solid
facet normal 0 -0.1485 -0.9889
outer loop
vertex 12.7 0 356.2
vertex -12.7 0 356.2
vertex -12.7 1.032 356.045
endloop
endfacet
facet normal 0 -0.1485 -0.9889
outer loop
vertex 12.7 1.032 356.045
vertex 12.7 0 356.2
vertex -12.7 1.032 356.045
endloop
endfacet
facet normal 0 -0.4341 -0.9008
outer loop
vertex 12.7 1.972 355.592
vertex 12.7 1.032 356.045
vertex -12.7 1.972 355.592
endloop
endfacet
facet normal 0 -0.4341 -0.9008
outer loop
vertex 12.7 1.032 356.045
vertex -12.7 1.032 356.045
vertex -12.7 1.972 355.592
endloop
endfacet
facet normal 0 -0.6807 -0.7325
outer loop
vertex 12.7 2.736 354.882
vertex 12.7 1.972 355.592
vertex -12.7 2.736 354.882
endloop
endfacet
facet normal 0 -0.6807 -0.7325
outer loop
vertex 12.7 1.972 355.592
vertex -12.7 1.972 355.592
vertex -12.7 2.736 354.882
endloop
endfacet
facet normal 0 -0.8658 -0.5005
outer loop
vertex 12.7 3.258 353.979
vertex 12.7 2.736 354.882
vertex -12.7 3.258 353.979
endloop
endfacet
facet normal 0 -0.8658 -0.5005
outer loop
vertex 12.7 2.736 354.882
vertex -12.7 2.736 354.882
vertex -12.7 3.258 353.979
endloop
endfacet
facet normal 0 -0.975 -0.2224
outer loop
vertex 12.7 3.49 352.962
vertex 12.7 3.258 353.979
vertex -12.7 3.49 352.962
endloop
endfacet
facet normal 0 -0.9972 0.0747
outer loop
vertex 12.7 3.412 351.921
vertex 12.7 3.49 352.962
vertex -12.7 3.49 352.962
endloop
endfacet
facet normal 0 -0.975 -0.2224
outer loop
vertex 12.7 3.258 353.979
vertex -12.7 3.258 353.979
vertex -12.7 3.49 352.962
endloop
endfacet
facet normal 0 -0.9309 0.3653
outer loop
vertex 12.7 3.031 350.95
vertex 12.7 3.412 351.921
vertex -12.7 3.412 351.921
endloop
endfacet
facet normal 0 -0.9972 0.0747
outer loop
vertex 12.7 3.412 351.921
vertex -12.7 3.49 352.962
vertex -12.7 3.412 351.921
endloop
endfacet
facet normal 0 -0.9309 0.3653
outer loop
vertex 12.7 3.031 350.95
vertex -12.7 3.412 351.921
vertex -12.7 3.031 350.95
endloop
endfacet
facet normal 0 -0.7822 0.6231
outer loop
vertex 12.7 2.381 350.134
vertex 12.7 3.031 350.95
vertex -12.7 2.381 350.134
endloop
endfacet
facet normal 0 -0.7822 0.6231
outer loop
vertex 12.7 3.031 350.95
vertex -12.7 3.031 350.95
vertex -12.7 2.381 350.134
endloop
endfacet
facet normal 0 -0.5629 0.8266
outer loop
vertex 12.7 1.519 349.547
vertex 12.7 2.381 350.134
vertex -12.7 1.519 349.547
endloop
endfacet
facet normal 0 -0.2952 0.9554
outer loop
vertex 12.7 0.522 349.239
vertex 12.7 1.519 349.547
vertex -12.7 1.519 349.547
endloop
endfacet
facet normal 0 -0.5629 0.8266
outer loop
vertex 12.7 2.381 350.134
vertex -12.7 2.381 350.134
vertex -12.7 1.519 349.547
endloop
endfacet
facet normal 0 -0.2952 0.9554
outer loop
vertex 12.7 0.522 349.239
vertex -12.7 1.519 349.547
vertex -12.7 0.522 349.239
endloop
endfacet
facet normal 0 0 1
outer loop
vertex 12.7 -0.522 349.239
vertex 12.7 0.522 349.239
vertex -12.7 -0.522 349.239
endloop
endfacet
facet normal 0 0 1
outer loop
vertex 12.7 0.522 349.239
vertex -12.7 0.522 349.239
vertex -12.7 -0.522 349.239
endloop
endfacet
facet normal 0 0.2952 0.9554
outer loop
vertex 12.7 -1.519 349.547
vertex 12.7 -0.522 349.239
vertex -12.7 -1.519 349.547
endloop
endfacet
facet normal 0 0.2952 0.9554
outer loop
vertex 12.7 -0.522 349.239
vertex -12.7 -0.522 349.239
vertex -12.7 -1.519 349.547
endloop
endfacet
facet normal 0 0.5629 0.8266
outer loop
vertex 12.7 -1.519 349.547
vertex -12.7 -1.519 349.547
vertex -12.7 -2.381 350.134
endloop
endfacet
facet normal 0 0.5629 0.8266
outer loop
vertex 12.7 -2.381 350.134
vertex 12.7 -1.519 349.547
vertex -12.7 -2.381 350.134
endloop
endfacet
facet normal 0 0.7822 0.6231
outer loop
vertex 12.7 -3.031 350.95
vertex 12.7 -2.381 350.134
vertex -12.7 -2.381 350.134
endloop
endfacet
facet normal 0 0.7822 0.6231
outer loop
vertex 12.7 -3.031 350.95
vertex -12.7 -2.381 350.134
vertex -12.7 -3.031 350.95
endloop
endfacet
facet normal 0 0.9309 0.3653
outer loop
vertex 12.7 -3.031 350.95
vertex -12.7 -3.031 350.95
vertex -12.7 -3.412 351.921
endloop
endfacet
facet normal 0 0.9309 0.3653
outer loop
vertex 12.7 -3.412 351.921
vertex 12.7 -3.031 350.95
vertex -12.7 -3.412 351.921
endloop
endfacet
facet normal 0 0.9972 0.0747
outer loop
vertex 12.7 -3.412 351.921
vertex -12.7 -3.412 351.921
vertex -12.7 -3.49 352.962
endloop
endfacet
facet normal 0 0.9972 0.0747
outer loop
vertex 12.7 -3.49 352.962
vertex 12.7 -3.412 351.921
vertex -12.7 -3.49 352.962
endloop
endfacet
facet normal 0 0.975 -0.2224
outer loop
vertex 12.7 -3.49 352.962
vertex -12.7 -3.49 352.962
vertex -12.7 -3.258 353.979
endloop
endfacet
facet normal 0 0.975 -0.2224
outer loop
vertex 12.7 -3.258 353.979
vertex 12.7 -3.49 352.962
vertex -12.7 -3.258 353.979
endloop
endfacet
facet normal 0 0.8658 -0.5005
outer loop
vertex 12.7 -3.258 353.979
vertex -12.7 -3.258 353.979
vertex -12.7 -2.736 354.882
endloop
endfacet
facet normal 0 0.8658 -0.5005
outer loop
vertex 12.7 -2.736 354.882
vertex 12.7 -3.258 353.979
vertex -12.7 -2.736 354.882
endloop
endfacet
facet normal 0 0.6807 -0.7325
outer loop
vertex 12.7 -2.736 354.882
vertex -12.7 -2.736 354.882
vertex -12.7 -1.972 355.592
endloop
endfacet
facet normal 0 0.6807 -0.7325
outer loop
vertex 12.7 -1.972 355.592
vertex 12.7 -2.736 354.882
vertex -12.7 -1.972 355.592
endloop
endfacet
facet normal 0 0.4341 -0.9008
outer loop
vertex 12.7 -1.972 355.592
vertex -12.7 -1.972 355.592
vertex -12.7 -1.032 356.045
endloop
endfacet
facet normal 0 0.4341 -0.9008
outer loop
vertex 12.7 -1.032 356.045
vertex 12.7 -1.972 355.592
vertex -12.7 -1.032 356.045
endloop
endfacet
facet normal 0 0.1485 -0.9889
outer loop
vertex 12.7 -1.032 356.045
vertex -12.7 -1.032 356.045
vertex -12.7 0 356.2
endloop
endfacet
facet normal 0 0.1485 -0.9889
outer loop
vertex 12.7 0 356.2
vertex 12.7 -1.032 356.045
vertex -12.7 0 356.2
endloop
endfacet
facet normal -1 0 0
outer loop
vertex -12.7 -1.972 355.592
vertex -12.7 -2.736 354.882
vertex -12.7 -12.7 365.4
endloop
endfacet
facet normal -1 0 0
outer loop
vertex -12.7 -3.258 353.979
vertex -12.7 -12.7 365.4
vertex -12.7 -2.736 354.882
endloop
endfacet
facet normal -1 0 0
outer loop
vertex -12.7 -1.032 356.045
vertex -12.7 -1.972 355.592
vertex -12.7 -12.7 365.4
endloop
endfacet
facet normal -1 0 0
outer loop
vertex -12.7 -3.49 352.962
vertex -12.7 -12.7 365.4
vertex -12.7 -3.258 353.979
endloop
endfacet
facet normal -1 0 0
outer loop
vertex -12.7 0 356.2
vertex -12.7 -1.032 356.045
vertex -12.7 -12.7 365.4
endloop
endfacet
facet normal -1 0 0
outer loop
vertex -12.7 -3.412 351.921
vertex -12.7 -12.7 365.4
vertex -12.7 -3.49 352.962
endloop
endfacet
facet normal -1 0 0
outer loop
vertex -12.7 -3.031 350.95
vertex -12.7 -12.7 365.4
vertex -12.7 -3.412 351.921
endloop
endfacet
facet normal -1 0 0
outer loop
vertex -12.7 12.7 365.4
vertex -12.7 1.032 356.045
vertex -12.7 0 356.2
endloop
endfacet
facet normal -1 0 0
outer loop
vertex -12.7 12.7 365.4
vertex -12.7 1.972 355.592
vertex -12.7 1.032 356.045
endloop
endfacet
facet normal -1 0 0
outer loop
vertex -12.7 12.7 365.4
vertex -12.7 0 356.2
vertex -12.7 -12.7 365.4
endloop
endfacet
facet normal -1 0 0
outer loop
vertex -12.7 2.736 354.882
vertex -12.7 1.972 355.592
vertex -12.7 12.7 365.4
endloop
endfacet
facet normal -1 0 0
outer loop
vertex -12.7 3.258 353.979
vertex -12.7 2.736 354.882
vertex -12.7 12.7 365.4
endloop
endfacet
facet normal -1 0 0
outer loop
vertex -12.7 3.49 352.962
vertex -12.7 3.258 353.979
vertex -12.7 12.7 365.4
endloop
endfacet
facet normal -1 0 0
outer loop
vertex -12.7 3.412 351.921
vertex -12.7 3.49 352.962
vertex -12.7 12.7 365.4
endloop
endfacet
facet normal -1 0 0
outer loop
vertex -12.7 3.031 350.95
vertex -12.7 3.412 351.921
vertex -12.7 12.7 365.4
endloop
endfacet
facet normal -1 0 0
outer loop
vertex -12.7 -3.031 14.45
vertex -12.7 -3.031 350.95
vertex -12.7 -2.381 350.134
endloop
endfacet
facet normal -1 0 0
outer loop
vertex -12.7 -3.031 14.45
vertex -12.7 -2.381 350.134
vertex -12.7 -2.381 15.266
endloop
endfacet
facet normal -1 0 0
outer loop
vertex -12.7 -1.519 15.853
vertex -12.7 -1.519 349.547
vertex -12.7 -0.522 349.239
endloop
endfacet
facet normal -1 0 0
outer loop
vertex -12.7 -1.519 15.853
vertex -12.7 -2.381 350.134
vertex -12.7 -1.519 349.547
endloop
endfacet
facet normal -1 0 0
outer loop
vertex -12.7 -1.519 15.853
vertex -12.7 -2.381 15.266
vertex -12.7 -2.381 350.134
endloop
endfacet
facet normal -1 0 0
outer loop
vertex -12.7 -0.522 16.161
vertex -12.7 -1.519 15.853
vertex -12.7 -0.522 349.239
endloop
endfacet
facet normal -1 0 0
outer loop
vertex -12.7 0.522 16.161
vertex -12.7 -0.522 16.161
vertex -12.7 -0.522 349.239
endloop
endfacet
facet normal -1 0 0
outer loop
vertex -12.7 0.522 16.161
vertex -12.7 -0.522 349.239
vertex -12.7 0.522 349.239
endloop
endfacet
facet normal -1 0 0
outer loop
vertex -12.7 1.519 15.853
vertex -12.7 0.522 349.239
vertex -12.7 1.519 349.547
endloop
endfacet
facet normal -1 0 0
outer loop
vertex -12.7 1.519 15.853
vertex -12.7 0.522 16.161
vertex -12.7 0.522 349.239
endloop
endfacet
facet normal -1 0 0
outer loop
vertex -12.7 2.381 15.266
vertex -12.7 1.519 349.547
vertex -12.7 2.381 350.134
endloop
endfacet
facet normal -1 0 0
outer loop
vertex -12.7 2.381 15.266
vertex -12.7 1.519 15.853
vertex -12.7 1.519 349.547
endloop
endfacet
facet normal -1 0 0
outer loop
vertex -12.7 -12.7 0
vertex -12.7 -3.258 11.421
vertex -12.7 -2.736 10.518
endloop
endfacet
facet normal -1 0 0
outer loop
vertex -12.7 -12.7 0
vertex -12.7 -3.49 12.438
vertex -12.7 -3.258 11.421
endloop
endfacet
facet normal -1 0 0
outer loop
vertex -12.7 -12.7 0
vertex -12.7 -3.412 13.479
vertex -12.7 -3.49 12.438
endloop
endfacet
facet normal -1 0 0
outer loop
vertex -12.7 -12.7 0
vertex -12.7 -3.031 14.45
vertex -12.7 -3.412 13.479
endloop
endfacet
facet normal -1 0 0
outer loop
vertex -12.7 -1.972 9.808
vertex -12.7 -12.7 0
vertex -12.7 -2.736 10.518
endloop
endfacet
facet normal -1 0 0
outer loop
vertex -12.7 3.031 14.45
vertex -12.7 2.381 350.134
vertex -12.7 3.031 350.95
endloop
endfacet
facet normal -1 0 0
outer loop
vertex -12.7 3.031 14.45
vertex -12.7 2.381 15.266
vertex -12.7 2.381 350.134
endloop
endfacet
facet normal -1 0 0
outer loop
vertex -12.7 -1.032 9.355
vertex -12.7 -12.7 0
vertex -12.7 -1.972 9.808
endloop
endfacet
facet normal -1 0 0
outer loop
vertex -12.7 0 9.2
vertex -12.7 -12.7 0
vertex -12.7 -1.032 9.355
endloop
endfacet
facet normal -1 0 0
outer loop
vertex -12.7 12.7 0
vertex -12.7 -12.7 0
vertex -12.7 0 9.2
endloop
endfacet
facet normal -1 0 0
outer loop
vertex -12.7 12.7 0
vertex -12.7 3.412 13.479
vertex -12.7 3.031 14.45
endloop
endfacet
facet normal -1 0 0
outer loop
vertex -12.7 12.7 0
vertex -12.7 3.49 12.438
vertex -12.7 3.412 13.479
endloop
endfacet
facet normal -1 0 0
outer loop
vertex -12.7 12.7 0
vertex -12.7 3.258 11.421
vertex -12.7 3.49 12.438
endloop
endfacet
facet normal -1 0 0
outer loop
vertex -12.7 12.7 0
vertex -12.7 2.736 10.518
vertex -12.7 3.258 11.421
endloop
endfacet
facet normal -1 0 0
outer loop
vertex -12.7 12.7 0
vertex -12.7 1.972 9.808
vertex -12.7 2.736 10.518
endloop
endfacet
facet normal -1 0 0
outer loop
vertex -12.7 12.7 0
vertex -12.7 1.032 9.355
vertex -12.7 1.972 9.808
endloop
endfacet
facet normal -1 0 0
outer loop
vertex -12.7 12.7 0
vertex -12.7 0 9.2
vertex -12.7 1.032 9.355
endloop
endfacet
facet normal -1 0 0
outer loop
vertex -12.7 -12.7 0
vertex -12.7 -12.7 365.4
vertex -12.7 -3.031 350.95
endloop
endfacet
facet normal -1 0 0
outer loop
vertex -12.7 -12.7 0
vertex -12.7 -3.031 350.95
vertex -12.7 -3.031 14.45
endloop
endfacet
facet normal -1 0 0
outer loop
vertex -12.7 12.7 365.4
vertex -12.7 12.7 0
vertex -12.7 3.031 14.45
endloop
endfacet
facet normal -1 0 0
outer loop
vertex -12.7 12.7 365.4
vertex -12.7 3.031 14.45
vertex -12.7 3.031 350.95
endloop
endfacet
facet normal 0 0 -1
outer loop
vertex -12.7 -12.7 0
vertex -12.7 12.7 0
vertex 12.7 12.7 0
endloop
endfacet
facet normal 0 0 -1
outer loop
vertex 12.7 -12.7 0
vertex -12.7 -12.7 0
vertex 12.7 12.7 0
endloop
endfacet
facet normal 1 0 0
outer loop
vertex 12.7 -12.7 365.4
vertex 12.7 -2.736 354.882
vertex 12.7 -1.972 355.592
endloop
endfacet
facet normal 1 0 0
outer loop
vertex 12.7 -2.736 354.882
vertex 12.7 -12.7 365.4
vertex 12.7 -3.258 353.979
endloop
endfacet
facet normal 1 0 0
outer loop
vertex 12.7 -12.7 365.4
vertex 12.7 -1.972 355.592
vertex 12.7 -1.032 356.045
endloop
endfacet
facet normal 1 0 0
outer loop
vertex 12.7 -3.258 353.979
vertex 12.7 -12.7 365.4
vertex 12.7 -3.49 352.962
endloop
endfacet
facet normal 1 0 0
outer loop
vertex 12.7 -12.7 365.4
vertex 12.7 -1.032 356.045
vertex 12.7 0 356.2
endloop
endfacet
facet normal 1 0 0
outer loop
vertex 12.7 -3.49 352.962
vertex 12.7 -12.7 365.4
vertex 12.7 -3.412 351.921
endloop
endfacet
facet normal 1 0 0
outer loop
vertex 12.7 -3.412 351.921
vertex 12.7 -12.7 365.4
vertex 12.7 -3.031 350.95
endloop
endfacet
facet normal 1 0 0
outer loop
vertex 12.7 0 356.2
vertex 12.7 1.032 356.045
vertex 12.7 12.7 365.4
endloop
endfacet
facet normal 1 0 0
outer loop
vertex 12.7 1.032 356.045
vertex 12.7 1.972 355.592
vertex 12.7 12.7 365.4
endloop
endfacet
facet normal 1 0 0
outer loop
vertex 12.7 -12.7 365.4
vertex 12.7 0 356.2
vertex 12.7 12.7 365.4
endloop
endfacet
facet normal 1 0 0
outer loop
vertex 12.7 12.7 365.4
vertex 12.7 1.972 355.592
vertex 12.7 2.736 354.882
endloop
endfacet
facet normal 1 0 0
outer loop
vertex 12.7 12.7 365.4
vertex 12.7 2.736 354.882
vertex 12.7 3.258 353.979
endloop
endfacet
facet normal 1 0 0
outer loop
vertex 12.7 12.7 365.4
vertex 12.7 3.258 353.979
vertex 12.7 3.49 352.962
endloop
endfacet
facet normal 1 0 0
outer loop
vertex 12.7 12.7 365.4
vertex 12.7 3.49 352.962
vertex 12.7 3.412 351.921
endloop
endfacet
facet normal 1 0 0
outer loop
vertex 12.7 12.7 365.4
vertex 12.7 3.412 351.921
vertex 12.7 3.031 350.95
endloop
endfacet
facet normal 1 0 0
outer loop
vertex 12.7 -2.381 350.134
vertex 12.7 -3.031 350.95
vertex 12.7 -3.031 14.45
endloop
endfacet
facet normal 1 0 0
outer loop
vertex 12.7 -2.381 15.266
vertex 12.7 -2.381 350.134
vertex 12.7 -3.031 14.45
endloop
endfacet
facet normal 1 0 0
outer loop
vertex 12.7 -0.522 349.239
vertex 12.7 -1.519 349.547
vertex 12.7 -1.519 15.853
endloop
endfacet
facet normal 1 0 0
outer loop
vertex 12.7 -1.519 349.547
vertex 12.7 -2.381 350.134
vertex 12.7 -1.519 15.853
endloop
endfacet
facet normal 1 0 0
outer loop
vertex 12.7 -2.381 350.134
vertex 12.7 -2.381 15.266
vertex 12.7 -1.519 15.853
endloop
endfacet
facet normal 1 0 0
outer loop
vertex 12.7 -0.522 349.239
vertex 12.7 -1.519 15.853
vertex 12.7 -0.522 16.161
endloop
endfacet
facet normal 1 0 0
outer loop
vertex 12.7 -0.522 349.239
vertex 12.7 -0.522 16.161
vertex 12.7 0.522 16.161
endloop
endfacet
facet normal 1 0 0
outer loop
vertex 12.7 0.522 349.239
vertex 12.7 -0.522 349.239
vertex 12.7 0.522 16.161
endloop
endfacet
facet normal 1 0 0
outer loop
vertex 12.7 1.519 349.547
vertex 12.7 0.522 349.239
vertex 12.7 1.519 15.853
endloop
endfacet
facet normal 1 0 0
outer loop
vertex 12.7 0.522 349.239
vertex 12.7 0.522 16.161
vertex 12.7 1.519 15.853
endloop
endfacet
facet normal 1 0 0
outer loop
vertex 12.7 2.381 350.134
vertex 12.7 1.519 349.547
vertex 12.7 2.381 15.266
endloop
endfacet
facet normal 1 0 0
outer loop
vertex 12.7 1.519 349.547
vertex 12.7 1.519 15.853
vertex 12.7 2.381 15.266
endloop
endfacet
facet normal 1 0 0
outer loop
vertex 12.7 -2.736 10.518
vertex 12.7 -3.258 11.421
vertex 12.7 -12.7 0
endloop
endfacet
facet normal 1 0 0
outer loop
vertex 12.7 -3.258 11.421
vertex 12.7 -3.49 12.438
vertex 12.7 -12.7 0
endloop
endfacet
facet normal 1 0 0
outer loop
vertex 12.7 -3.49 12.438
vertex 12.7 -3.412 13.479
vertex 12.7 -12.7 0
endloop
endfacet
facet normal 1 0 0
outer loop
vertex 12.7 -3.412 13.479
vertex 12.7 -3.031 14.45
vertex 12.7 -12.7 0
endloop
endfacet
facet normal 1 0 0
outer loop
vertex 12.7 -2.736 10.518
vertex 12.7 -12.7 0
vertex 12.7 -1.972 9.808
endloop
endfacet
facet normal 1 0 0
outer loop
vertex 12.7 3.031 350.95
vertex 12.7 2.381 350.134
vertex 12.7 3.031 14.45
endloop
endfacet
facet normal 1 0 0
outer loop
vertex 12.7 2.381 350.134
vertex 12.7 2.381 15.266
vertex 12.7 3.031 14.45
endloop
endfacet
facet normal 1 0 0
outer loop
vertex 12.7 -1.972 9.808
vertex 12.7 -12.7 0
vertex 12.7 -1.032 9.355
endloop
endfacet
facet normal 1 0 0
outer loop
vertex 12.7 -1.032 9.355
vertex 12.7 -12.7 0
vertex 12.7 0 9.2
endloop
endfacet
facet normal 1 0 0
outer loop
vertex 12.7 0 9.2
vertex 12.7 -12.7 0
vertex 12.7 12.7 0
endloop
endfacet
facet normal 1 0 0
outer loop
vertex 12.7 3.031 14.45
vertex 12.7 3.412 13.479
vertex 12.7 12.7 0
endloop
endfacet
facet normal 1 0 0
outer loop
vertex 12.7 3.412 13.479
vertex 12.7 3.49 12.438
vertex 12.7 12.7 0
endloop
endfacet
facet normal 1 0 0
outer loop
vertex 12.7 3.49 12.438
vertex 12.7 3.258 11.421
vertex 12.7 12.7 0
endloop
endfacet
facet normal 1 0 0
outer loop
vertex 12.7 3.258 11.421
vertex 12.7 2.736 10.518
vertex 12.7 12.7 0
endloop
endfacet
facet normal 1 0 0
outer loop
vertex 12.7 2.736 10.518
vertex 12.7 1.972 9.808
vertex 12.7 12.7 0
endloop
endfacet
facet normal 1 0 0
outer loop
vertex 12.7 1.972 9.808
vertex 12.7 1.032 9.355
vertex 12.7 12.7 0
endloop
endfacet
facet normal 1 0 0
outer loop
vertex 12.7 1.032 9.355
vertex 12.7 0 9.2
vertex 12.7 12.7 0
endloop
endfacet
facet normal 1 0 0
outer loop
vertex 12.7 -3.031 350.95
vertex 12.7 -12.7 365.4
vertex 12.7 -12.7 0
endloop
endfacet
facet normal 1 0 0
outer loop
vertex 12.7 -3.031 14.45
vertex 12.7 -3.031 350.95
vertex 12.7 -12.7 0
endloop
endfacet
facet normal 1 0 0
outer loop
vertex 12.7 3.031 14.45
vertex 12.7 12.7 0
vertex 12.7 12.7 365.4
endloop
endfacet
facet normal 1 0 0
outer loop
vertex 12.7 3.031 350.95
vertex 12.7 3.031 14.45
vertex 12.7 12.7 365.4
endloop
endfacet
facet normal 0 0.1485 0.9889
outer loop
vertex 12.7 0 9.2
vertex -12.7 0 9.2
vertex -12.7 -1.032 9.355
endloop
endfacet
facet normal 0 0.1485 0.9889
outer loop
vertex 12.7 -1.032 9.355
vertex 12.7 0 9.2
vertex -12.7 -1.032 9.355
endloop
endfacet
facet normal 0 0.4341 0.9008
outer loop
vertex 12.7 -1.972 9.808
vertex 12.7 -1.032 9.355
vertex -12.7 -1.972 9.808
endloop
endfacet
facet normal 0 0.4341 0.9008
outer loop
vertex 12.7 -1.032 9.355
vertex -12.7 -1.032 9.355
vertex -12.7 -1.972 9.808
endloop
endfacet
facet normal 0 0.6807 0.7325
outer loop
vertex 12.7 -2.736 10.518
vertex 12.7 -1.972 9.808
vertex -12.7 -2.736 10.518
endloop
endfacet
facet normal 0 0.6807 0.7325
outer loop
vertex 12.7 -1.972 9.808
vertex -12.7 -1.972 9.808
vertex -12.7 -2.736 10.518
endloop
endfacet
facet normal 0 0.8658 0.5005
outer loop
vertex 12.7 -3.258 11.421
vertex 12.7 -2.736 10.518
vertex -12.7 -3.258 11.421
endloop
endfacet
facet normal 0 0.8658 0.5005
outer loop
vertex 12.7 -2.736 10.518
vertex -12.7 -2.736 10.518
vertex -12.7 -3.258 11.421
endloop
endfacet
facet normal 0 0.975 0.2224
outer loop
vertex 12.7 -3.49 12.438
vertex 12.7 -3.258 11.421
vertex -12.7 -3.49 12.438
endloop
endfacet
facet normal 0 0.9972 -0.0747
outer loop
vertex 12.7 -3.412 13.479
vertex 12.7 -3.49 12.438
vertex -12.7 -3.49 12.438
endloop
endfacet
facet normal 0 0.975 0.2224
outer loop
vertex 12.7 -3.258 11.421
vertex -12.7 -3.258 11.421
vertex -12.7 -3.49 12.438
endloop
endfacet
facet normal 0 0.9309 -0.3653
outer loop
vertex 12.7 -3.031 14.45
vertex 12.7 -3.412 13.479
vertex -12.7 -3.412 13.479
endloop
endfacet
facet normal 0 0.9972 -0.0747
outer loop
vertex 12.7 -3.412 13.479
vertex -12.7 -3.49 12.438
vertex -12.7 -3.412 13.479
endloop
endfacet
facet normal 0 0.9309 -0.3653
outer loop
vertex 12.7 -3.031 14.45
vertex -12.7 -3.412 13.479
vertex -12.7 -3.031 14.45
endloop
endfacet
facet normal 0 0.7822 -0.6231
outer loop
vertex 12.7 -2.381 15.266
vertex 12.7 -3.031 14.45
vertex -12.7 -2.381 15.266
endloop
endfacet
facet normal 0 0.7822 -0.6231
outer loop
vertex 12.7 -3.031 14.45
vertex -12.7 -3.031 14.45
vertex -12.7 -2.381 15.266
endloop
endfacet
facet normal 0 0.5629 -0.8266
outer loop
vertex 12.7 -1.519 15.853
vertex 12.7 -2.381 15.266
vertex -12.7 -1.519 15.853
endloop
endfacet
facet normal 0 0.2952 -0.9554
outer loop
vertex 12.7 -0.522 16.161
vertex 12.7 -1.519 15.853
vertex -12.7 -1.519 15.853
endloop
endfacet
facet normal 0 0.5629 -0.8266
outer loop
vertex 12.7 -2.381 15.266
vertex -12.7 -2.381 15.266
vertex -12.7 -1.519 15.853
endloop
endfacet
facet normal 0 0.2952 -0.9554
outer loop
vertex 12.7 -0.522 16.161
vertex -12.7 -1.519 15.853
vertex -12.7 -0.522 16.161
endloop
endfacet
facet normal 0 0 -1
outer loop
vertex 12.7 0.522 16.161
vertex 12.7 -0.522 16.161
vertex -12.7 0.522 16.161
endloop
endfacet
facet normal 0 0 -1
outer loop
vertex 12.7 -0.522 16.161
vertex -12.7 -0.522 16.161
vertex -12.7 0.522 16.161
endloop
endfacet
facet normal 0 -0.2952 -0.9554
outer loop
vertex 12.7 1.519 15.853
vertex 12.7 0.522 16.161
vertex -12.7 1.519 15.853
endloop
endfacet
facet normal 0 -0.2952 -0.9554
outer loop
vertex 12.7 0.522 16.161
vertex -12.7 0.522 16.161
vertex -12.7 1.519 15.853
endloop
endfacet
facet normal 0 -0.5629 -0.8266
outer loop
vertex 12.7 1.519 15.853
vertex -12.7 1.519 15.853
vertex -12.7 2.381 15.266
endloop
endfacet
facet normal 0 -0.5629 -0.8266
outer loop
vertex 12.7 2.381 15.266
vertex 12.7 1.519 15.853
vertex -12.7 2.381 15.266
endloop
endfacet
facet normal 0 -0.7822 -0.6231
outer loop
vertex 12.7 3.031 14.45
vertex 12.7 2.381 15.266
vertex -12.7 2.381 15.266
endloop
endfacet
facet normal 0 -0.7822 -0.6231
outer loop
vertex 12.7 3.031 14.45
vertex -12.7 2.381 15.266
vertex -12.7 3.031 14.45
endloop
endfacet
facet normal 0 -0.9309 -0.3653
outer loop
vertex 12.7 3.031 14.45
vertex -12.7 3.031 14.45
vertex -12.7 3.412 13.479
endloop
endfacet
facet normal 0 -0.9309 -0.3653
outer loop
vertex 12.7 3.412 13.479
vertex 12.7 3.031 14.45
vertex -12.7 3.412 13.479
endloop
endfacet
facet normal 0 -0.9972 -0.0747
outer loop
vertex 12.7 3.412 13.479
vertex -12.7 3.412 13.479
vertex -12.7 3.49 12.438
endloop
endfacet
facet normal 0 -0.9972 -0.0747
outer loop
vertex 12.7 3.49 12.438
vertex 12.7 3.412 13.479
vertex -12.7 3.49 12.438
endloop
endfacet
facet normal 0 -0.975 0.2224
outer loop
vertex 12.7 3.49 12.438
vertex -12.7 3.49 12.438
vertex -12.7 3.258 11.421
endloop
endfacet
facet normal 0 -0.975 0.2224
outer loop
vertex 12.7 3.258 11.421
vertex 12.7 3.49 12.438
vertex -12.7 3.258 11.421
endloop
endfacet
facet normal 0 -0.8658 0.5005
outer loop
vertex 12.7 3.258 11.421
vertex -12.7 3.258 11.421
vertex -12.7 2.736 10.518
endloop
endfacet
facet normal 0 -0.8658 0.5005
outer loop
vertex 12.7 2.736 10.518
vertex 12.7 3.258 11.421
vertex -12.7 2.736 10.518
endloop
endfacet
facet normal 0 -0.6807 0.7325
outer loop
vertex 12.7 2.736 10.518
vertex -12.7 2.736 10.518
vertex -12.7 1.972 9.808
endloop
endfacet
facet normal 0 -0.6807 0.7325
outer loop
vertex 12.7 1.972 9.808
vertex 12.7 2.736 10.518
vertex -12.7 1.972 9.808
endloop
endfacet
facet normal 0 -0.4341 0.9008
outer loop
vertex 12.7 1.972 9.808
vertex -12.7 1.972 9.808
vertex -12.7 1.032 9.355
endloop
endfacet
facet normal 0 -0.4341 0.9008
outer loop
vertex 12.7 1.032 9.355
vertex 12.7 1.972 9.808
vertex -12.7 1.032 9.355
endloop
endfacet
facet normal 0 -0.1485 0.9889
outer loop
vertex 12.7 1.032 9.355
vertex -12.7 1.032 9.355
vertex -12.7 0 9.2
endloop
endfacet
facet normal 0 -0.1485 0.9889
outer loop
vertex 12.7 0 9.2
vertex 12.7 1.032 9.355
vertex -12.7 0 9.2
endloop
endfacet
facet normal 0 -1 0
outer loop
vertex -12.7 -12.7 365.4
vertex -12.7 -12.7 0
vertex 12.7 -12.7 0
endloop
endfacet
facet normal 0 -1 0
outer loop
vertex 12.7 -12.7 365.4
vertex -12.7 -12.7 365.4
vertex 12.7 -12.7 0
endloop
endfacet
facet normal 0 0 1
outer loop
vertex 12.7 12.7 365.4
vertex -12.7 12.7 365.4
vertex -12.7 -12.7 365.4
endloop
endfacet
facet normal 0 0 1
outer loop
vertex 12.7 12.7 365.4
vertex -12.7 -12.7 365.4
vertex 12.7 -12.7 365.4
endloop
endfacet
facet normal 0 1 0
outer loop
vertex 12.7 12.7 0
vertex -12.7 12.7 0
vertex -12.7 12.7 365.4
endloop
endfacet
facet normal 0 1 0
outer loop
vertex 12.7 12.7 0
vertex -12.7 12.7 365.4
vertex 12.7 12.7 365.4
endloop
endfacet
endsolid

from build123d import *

# Parameters (mm, degrees)
SKETCH1_W           = 25.4
SKETCH1_H           = 25.4
BOSS_EXTRUDE1_DEPTH = 365.4
SKETCH10_R          = 3.5
CUT_EXTRUDE6_DEPTH  = 367.501855384


with BuildPart() as part:
    # Sketch1 → Boss-Extrude1 (new body)
    with BuildSketch(Plane.XY):
        Rectangle(SKETCH1_W, SKETCH1_H)
    extrude(amount=BOSS_EXTRUDE1_DEPTH)

    # Sketch10 → Cut-Extrude6 (cut, through all)
    with BuildSketch(Plane.ZY.offset(12.7)):
        with Locations((352.7, 0)):
            Circle(SKETCH10_R)
        with Locations(Location((12.7, 0, 0), (0, 0, 180))):
            Circle(SKETCH10_R)
    extrude(amount=-CUT_EXTRUDE6_DEPTH, mode=Mode.SUBTRACT)


solid = part.part
